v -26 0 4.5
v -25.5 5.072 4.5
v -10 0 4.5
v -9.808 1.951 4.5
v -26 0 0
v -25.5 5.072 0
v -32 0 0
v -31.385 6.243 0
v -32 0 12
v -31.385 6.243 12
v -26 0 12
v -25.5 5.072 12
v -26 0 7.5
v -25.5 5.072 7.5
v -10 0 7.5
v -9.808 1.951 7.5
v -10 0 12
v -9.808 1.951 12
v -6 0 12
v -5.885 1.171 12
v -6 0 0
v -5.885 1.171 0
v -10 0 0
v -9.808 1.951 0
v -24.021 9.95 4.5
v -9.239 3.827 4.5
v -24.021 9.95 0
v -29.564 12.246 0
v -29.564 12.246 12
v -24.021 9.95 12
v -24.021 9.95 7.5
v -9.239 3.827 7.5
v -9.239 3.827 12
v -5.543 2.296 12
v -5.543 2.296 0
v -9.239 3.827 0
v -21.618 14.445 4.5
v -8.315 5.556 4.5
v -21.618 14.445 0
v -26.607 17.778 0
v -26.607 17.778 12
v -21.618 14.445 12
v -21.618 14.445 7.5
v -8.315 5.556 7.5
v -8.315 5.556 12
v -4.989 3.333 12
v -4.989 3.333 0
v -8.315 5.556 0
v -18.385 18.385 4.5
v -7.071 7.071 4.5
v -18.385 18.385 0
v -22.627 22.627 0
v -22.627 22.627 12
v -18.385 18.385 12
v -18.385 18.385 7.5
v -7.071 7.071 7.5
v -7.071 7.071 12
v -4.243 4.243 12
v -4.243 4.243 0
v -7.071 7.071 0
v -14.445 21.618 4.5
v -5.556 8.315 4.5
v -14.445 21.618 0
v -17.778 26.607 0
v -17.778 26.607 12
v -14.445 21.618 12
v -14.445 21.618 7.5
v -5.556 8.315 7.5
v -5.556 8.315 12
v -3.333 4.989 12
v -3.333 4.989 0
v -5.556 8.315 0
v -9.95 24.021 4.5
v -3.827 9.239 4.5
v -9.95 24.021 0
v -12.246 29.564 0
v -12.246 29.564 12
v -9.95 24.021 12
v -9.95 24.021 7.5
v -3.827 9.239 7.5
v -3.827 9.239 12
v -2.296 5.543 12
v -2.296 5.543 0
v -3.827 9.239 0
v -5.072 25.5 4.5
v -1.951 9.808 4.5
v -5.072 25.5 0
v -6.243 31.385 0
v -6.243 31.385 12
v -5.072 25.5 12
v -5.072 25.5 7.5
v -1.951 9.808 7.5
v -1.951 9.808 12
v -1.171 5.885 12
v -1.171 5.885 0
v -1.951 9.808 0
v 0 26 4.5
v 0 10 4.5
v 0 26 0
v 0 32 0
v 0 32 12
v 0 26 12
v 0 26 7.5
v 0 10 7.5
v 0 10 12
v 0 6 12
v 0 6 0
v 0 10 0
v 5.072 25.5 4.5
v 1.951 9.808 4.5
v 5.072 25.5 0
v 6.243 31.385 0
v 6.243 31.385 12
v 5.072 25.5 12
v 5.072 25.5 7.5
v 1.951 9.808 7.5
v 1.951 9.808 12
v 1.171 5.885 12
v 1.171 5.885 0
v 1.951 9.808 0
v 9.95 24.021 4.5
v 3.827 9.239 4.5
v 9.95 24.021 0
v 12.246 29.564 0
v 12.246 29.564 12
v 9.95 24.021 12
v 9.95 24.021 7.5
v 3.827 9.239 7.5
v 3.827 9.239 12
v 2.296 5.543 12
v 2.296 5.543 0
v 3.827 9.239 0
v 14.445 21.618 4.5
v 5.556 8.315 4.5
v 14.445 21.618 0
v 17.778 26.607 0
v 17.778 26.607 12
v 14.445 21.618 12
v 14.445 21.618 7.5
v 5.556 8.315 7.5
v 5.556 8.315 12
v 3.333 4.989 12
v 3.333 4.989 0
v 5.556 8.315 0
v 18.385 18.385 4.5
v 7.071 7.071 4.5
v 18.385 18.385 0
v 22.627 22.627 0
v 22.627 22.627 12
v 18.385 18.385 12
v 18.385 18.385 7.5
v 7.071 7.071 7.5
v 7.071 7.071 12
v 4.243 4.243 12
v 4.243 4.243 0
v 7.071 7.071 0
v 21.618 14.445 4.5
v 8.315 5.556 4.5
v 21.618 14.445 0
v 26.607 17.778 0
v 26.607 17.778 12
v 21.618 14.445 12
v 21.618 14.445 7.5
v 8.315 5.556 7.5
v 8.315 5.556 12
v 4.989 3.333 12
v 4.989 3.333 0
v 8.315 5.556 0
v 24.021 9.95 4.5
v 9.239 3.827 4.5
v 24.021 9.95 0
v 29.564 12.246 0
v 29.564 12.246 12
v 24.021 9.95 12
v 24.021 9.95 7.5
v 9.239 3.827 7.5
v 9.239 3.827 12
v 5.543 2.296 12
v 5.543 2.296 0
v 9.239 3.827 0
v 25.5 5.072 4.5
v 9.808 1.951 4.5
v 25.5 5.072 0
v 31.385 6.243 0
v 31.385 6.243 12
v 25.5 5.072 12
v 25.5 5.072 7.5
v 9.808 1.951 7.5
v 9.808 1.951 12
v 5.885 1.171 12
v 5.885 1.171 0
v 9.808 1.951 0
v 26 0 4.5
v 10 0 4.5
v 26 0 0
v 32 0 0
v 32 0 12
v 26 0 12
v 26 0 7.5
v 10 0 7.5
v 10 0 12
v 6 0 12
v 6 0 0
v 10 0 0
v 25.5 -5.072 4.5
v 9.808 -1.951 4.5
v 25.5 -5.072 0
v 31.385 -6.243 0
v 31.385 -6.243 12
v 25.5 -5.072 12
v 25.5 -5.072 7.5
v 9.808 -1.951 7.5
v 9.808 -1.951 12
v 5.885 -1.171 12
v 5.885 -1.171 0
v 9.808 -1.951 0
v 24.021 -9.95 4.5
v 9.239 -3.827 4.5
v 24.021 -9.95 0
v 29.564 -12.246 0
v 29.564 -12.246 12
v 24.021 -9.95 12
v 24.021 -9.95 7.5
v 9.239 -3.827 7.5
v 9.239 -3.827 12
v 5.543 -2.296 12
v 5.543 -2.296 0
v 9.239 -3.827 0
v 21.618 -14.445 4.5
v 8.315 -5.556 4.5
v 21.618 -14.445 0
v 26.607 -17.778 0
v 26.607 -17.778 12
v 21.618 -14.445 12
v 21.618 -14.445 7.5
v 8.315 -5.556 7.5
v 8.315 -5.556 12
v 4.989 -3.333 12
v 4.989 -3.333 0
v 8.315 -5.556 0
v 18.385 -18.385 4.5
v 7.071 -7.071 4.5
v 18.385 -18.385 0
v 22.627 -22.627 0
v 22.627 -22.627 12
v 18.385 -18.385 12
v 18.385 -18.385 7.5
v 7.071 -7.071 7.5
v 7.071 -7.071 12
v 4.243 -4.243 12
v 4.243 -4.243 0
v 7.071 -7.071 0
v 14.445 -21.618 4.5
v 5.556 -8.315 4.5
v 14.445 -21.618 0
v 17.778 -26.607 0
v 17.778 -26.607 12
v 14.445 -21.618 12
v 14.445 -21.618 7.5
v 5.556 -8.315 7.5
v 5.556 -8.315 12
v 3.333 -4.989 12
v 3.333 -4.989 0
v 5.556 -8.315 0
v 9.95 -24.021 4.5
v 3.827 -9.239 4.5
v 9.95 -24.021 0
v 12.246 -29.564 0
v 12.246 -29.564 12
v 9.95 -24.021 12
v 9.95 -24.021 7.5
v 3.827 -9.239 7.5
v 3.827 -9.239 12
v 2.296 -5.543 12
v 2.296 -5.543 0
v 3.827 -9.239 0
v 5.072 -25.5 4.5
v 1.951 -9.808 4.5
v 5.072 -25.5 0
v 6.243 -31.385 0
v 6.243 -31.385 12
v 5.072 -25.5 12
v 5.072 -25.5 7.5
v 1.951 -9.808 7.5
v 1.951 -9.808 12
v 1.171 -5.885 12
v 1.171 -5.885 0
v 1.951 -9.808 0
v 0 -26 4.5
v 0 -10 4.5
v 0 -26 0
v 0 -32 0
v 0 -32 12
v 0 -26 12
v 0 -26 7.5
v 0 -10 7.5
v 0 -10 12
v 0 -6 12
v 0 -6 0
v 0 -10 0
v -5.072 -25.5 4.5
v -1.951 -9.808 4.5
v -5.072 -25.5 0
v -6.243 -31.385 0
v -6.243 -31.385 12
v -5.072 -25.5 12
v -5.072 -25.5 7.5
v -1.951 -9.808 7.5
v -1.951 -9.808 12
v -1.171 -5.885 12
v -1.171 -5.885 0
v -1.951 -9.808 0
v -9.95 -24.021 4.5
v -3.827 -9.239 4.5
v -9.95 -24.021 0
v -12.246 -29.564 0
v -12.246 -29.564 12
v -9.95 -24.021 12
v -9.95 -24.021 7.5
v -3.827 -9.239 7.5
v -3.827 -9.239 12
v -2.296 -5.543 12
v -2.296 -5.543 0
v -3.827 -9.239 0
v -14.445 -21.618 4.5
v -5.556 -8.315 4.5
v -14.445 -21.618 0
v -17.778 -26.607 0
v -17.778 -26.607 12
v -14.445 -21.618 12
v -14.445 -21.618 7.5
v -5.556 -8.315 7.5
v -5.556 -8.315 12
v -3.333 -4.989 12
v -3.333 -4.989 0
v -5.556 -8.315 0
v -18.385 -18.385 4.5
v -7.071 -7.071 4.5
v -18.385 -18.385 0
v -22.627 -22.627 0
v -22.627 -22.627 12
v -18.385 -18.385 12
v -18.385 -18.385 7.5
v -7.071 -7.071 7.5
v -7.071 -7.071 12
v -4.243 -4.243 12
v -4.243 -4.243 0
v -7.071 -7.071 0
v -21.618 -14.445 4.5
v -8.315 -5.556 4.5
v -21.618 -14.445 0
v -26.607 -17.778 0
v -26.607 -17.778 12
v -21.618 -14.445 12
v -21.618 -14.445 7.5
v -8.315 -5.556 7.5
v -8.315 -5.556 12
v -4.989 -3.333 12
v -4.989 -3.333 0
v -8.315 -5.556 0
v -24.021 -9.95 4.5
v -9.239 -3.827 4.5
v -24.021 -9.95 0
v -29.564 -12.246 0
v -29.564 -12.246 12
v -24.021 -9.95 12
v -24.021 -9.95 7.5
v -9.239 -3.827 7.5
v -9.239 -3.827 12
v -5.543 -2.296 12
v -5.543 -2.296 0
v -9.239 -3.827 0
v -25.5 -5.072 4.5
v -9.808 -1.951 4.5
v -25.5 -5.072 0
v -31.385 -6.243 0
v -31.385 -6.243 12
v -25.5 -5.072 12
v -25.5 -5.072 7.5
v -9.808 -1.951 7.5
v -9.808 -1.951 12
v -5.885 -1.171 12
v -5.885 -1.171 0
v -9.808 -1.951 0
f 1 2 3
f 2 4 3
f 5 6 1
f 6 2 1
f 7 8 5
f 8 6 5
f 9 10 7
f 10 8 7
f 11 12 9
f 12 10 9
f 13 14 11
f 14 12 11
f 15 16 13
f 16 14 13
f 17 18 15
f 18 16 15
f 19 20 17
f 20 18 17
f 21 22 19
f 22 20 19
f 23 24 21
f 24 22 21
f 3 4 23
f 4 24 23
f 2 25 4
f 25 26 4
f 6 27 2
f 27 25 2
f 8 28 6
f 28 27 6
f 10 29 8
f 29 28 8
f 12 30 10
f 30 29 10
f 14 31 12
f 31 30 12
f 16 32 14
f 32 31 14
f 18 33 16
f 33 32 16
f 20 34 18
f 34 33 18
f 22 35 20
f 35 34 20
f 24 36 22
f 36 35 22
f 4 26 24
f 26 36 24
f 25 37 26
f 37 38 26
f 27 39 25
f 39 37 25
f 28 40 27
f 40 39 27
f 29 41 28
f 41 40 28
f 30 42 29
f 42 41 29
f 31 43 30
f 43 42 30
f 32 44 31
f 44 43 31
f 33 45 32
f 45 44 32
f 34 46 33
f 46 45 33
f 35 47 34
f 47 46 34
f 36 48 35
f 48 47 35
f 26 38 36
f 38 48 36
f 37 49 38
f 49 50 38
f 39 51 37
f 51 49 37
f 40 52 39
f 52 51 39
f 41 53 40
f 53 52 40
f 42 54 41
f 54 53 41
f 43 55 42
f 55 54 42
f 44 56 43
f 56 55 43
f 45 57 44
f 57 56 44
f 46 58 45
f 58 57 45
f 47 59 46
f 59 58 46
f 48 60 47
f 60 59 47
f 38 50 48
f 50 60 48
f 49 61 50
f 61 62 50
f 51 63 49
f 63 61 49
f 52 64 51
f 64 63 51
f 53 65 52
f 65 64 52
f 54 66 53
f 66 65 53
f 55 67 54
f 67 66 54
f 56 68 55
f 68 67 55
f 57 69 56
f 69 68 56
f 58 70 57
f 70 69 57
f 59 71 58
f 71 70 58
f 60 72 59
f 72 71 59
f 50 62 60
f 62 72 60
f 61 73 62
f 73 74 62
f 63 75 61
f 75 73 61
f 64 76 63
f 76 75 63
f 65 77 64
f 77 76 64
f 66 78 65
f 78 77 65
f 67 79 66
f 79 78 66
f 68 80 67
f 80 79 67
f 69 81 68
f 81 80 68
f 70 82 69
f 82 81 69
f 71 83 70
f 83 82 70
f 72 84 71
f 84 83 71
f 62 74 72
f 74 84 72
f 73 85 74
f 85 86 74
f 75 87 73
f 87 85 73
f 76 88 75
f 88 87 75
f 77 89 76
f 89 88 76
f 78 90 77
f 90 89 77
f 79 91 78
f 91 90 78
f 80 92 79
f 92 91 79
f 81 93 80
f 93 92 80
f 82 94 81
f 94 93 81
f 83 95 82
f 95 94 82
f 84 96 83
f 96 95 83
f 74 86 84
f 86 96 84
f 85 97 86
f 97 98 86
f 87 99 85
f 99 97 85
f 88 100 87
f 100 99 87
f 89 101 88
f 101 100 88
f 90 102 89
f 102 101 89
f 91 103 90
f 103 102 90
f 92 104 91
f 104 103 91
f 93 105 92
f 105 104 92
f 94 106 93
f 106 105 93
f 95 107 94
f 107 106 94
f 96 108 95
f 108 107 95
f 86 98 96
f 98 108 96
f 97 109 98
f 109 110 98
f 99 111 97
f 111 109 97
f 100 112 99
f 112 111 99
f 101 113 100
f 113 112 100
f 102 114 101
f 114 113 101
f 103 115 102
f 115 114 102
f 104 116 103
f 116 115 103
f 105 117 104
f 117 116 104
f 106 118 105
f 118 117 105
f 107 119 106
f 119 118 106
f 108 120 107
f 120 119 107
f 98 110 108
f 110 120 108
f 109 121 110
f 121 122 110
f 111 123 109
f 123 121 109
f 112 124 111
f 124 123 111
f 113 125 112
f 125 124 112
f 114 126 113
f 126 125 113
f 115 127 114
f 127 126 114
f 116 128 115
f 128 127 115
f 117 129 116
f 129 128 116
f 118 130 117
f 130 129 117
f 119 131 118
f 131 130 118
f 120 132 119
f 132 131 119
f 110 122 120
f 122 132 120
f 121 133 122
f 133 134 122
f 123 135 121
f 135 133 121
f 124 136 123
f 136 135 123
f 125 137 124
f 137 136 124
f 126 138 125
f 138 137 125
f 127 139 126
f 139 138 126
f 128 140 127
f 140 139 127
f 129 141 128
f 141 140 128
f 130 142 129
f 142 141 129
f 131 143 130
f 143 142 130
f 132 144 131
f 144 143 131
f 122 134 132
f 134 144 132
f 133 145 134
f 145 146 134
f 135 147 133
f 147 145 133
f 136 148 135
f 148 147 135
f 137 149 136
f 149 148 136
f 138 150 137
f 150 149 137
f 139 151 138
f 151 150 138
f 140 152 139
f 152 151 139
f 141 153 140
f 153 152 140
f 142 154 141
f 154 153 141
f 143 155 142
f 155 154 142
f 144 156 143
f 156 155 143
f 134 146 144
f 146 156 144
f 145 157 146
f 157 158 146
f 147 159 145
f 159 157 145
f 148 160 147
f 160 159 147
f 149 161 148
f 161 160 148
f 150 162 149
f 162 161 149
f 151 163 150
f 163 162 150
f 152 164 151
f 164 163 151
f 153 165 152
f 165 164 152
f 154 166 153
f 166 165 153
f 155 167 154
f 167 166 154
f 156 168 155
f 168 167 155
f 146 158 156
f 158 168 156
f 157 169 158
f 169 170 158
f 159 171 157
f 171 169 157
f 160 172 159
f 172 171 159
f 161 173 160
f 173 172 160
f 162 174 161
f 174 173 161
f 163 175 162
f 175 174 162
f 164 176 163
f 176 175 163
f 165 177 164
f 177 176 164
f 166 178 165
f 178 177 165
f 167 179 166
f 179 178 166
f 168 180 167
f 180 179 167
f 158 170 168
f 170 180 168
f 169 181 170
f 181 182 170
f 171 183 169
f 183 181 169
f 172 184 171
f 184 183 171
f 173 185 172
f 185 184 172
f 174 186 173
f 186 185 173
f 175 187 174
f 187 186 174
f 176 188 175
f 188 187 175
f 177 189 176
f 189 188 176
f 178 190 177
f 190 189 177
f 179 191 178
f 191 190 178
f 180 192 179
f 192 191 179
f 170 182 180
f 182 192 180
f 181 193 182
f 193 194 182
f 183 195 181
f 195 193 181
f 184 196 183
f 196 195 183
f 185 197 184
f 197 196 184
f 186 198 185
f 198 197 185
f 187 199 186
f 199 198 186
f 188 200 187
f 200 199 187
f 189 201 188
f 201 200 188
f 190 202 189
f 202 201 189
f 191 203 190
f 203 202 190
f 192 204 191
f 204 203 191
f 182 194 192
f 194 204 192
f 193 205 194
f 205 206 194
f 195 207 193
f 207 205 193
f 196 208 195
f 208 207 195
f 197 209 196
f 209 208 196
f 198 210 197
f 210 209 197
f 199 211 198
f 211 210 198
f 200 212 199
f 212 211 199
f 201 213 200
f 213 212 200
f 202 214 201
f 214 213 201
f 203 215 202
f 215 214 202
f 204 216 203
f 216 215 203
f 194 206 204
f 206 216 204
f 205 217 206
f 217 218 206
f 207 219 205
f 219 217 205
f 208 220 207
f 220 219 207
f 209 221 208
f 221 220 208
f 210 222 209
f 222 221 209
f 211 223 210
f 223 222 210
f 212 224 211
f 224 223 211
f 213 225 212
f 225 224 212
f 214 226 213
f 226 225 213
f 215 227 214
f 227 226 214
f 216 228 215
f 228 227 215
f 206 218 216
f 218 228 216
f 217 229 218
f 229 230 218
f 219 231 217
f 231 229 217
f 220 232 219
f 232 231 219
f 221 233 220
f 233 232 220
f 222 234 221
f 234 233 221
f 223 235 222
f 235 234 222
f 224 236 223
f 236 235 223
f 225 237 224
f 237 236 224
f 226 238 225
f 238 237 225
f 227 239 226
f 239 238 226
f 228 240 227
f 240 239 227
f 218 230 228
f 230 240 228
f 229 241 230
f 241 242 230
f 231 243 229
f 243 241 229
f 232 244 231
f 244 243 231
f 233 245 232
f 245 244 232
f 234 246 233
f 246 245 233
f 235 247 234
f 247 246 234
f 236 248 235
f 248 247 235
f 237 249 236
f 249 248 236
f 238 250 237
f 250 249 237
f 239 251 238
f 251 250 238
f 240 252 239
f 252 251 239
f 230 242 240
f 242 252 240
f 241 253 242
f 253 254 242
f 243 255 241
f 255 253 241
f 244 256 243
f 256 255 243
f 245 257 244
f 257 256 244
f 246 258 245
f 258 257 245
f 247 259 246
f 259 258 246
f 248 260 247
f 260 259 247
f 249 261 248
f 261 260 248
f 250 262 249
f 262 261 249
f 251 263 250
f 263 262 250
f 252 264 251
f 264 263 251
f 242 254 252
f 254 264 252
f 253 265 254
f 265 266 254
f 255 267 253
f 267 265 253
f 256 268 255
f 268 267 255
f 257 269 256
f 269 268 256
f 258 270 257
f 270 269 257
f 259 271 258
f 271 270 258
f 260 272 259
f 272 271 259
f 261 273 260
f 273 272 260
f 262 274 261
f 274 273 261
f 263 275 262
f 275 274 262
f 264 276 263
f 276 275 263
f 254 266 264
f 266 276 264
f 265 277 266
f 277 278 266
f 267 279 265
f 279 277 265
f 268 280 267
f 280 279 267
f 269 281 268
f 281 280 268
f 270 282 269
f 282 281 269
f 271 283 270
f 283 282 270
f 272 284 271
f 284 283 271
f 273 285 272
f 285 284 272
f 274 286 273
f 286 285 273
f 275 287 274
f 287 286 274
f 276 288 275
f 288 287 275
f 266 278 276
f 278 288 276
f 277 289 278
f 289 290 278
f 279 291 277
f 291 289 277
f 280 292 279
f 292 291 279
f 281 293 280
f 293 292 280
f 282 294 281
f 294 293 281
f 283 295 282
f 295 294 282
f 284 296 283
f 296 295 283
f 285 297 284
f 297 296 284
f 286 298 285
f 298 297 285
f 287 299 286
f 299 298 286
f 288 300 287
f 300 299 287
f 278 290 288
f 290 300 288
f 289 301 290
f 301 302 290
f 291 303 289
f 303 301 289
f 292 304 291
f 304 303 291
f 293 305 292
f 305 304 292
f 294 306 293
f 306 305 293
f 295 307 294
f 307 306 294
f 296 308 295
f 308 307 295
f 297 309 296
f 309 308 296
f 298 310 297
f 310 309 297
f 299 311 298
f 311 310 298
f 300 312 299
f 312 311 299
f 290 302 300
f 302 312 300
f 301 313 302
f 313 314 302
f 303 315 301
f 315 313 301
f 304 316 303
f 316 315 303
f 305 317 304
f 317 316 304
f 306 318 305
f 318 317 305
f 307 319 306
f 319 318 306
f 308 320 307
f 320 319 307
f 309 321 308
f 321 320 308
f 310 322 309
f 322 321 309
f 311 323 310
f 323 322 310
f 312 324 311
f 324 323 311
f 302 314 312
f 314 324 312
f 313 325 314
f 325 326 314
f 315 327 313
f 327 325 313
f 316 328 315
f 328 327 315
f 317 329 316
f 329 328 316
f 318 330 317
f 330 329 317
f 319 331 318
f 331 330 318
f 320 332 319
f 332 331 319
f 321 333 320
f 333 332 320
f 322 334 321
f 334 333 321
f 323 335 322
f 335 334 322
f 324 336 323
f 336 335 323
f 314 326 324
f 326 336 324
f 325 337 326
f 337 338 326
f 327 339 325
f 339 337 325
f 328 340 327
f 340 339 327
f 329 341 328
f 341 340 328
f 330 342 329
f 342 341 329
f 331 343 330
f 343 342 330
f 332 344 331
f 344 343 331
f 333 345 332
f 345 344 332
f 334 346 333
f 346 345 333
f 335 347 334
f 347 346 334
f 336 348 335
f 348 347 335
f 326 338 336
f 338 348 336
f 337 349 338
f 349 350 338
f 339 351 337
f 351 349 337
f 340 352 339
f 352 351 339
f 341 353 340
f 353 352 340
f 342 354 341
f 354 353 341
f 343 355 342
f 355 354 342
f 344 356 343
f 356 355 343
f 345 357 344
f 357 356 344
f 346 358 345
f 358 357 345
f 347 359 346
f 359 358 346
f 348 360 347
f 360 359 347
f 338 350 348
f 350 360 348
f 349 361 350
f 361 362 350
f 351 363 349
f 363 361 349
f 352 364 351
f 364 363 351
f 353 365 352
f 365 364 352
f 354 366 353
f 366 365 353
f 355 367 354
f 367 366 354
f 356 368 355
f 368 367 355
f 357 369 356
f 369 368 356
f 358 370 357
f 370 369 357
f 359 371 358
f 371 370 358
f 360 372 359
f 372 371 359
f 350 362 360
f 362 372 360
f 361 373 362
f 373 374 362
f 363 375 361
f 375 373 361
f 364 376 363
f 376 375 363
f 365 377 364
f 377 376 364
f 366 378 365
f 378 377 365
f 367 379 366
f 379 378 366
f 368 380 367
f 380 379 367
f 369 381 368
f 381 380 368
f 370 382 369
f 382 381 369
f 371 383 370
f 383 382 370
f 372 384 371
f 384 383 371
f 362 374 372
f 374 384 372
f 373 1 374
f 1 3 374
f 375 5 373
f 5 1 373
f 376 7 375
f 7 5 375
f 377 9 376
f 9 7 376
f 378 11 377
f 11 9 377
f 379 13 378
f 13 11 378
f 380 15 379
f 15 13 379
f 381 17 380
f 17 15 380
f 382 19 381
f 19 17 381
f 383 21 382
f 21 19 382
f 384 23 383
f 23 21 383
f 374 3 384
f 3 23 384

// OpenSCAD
$fn = 32;

// ----------------------------------------------------------------------
// Revolved part: handwheel R32
// ----------------------------------------------------------------------

// --- parameters (mm) ---
bore_r = 6;               // bore radius
rim_r = 32;               // rim radius
rim_w = 6;                // rim axial width
rim_t = 12;               // rim diameter height
hub_r = 10;               // hub radius
web_t = 3;                // web thickness
revolve_angle = 360;      // revolve sweep, degrees

bore_d = 2 * bore_r;
rim_d = 2 * rim_r;
hub_d = 2 * hub_r;

profile = [[6, 0], [10, 0], [10, 4.5], [26, 4.5], [26, 0], [32, 0], [32, 12], [26, 12], [26, 7.5], [10, 7.5], [10, 12], [6, 12]];  // primary outline, 12 points, counter clockwise

// --- the one profile operation ---
rotate_extrude(angle = revolve_angle) polygon(points = profile);
